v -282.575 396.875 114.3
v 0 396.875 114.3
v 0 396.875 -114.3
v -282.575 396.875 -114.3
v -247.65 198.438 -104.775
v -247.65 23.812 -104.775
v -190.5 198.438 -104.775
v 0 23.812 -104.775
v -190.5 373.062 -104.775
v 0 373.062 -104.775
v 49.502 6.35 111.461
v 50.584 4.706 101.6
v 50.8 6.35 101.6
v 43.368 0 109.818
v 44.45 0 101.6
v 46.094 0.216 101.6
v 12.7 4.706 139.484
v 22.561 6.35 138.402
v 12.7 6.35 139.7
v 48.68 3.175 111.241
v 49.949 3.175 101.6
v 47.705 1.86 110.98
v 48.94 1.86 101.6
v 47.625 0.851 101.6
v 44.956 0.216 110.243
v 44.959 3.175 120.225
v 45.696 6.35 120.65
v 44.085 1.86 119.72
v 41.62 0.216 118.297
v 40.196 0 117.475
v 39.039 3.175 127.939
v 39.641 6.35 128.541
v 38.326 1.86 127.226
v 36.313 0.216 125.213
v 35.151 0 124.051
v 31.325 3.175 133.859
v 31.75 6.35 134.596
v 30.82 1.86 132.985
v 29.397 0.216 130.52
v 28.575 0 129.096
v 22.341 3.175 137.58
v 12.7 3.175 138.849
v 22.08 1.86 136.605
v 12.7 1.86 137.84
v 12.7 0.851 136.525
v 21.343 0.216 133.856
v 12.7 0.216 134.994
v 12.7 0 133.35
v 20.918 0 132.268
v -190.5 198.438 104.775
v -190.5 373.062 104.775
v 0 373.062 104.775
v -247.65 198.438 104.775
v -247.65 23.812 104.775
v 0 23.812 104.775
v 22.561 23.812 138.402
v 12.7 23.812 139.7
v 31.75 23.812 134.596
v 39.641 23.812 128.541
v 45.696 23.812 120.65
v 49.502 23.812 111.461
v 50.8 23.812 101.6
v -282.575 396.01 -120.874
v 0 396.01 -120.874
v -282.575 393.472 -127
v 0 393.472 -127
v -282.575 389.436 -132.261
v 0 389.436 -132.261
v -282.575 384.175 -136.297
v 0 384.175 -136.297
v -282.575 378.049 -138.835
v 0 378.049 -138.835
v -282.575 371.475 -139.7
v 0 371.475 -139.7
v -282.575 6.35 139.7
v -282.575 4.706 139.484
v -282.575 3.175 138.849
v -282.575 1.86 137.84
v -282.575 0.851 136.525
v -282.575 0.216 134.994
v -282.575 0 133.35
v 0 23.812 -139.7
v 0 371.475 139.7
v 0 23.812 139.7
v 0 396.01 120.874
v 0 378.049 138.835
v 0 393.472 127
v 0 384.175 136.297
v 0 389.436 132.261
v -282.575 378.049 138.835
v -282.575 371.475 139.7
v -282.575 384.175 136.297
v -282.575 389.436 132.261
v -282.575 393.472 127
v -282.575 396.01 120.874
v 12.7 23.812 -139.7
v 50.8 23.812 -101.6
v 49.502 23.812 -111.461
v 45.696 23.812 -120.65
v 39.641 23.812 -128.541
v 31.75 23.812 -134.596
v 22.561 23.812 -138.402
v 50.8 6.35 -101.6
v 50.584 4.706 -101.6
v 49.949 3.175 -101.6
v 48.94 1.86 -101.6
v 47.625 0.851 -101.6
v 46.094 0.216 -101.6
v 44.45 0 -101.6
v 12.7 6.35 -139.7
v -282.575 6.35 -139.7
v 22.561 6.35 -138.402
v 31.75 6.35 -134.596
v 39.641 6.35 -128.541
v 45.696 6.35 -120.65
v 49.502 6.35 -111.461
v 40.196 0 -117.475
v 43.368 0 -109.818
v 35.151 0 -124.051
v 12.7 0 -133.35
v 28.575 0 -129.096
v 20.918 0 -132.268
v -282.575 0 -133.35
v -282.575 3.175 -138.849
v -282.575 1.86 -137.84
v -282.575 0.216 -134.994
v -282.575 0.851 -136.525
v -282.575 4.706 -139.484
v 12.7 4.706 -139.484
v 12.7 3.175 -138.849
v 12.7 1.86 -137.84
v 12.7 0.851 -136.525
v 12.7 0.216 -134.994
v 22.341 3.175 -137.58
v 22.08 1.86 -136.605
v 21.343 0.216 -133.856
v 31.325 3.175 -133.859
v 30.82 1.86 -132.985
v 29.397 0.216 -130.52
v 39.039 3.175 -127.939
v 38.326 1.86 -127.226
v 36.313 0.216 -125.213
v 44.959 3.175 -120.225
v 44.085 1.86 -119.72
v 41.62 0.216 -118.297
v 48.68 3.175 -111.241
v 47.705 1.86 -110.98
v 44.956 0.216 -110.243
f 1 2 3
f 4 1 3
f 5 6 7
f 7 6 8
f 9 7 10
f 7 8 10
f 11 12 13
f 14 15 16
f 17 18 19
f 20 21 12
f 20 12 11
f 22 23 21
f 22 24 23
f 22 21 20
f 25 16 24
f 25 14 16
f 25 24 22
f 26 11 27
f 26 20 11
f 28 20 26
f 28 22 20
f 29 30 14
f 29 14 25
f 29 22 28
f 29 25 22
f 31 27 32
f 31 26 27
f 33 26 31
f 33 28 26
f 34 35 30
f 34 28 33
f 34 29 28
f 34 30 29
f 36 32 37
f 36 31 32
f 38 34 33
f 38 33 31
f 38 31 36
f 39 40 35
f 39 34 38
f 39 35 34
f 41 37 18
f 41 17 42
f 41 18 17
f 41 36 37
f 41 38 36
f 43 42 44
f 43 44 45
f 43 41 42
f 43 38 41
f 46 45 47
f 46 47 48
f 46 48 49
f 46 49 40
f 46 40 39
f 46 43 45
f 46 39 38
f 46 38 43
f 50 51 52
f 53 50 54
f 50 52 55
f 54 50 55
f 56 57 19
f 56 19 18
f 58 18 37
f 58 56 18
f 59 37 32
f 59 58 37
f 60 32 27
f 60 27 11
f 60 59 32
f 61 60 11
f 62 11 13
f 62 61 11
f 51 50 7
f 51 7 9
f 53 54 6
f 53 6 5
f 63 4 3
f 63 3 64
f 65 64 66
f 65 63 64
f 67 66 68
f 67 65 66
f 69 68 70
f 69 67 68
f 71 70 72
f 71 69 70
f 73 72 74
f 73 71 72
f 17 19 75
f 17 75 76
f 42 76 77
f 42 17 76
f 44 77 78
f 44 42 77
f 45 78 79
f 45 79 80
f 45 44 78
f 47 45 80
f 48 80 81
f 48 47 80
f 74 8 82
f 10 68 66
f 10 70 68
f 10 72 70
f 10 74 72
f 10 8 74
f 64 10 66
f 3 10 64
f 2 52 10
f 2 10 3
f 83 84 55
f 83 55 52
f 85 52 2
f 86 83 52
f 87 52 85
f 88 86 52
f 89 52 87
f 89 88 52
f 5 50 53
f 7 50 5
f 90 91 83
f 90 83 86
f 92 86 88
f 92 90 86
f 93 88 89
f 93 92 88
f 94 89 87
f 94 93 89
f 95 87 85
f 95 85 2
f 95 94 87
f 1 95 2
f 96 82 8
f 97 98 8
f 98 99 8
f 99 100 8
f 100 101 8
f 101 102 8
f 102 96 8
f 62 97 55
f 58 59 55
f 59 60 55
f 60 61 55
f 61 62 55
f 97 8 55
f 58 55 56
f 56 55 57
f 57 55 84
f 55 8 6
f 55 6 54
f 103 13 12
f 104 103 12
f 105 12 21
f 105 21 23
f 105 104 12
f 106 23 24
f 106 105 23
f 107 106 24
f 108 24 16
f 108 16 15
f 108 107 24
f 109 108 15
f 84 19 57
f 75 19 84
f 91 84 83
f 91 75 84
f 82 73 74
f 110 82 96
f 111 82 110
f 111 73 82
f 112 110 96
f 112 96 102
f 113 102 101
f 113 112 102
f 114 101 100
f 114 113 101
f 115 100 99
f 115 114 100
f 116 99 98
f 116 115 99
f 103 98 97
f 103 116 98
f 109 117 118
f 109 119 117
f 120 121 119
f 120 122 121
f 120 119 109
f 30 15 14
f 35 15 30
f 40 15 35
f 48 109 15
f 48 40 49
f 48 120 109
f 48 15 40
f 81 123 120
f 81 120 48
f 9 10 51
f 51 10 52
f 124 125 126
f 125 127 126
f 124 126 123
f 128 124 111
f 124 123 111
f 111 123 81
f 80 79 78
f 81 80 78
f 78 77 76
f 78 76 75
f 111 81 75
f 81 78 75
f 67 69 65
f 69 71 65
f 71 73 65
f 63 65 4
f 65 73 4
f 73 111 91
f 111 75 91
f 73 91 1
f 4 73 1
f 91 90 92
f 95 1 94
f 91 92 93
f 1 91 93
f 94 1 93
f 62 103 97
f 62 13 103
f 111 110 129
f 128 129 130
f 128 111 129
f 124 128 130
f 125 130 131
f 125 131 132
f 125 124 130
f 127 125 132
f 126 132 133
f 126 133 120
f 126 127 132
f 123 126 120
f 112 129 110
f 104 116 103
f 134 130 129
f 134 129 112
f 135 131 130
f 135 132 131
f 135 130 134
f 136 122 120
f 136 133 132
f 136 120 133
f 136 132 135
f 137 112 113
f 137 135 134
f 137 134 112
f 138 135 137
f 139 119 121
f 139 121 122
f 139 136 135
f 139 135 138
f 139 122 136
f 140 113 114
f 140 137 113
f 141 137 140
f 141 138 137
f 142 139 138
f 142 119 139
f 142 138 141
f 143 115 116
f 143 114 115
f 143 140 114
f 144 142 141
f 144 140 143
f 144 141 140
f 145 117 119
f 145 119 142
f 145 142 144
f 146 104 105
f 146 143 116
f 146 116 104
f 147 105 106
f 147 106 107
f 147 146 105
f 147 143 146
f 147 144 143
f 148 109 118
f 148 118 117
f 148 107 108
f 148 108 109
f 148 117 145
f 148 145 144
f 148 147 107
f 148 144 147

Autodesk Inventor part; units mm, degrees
ref_plane "YZ Plane" through (0, 0, 0) normal (1, 0, 0) x (0, 1, 0)
ref_plane "XZ Plane" through (0, 0, 0) normal (0, 1, 0) x (-1, 0, 0)
ref_plane "XY Plane" through (0, 0, 0) normal (0, 0, 1) x (1, 0, 0)
sketch "Sketch1" plane through (0, 0, 0) normal (1, 0, 0) x (0, 1, 0)
  line L0 (0, 139.7) -> (396.875, 139.7)
  line L1 (396.875, 139.7) -> (396.875, -139.7)
  line L2 (396.875, -139.7) -> (0, -139.7)
  line L3 (0, -139.7) -> (0, 139.7)
  line L4 (396.875, -139.7) -> (0, 139.7) construction
  line L5 (23.8125, -104.775) -> (373.0625, -104.775)
  line L6 (373.0625, -104.775) -> (373.0625, 104.775)
  line L7 (373.0625, 104.775) -> (23.8125, 104.775)
  line L8 (23.8125, 104.775) -> (23.8125, -104.775)
  line L9 (23.8125, -104.775) -> (373.0625, 104.775) construction
  line L10 (373.0625, -104.775) -> (23.8125, 104.775) construction
  line L11 (23.8125, 104.775) -> (23.8125, 139.7)
  line L12 (23.8125, -104.775) -> (23.8125, -139.7)
  line L13 (198.4375, 104.775) -> (198.4375, -104.775)
  point P0 (0, 0)
  point P1 (0, 0)
  point P2 (198.4375, 0)
  dimension "d0" = 396.875
  dimension "d1" = 279.4
  dimension "d2" = 349.25
  dimension "d3" = 209.55
extrude "Extrusion1" add sketch "Sketch1" against normal blind 282.575
extrude "Extrusion2" add sketch "Sketch1" along normal blind 50.8 contours L0 L11 L8 L12 L2 L3
extrude "Extrusion3" cut sketch "Sketch1" against normal blind 190.5 contours L7 L6 L5 L13
extrude "Extrusion4" cut sketch "Sketch1" against normal blind 247.65 contours L7 L13 L5 L8
fillet "Fillet3" radius 38.1 2 edges at (50.8, 11.9063, -139.7) (50.8, 11.9062, 139.7)
fillet "Fillet1" radius 25.4 2 edges at (-141.2875, 396.875, 139.7) (-141.2875, 396.875, -139.7)
fillet "Fillet2" radius 6.35 2 edges at (-134.9375, 0, 139.7) (-134.9375, 0, -139.7)
properties part number "Fridge-Body"
